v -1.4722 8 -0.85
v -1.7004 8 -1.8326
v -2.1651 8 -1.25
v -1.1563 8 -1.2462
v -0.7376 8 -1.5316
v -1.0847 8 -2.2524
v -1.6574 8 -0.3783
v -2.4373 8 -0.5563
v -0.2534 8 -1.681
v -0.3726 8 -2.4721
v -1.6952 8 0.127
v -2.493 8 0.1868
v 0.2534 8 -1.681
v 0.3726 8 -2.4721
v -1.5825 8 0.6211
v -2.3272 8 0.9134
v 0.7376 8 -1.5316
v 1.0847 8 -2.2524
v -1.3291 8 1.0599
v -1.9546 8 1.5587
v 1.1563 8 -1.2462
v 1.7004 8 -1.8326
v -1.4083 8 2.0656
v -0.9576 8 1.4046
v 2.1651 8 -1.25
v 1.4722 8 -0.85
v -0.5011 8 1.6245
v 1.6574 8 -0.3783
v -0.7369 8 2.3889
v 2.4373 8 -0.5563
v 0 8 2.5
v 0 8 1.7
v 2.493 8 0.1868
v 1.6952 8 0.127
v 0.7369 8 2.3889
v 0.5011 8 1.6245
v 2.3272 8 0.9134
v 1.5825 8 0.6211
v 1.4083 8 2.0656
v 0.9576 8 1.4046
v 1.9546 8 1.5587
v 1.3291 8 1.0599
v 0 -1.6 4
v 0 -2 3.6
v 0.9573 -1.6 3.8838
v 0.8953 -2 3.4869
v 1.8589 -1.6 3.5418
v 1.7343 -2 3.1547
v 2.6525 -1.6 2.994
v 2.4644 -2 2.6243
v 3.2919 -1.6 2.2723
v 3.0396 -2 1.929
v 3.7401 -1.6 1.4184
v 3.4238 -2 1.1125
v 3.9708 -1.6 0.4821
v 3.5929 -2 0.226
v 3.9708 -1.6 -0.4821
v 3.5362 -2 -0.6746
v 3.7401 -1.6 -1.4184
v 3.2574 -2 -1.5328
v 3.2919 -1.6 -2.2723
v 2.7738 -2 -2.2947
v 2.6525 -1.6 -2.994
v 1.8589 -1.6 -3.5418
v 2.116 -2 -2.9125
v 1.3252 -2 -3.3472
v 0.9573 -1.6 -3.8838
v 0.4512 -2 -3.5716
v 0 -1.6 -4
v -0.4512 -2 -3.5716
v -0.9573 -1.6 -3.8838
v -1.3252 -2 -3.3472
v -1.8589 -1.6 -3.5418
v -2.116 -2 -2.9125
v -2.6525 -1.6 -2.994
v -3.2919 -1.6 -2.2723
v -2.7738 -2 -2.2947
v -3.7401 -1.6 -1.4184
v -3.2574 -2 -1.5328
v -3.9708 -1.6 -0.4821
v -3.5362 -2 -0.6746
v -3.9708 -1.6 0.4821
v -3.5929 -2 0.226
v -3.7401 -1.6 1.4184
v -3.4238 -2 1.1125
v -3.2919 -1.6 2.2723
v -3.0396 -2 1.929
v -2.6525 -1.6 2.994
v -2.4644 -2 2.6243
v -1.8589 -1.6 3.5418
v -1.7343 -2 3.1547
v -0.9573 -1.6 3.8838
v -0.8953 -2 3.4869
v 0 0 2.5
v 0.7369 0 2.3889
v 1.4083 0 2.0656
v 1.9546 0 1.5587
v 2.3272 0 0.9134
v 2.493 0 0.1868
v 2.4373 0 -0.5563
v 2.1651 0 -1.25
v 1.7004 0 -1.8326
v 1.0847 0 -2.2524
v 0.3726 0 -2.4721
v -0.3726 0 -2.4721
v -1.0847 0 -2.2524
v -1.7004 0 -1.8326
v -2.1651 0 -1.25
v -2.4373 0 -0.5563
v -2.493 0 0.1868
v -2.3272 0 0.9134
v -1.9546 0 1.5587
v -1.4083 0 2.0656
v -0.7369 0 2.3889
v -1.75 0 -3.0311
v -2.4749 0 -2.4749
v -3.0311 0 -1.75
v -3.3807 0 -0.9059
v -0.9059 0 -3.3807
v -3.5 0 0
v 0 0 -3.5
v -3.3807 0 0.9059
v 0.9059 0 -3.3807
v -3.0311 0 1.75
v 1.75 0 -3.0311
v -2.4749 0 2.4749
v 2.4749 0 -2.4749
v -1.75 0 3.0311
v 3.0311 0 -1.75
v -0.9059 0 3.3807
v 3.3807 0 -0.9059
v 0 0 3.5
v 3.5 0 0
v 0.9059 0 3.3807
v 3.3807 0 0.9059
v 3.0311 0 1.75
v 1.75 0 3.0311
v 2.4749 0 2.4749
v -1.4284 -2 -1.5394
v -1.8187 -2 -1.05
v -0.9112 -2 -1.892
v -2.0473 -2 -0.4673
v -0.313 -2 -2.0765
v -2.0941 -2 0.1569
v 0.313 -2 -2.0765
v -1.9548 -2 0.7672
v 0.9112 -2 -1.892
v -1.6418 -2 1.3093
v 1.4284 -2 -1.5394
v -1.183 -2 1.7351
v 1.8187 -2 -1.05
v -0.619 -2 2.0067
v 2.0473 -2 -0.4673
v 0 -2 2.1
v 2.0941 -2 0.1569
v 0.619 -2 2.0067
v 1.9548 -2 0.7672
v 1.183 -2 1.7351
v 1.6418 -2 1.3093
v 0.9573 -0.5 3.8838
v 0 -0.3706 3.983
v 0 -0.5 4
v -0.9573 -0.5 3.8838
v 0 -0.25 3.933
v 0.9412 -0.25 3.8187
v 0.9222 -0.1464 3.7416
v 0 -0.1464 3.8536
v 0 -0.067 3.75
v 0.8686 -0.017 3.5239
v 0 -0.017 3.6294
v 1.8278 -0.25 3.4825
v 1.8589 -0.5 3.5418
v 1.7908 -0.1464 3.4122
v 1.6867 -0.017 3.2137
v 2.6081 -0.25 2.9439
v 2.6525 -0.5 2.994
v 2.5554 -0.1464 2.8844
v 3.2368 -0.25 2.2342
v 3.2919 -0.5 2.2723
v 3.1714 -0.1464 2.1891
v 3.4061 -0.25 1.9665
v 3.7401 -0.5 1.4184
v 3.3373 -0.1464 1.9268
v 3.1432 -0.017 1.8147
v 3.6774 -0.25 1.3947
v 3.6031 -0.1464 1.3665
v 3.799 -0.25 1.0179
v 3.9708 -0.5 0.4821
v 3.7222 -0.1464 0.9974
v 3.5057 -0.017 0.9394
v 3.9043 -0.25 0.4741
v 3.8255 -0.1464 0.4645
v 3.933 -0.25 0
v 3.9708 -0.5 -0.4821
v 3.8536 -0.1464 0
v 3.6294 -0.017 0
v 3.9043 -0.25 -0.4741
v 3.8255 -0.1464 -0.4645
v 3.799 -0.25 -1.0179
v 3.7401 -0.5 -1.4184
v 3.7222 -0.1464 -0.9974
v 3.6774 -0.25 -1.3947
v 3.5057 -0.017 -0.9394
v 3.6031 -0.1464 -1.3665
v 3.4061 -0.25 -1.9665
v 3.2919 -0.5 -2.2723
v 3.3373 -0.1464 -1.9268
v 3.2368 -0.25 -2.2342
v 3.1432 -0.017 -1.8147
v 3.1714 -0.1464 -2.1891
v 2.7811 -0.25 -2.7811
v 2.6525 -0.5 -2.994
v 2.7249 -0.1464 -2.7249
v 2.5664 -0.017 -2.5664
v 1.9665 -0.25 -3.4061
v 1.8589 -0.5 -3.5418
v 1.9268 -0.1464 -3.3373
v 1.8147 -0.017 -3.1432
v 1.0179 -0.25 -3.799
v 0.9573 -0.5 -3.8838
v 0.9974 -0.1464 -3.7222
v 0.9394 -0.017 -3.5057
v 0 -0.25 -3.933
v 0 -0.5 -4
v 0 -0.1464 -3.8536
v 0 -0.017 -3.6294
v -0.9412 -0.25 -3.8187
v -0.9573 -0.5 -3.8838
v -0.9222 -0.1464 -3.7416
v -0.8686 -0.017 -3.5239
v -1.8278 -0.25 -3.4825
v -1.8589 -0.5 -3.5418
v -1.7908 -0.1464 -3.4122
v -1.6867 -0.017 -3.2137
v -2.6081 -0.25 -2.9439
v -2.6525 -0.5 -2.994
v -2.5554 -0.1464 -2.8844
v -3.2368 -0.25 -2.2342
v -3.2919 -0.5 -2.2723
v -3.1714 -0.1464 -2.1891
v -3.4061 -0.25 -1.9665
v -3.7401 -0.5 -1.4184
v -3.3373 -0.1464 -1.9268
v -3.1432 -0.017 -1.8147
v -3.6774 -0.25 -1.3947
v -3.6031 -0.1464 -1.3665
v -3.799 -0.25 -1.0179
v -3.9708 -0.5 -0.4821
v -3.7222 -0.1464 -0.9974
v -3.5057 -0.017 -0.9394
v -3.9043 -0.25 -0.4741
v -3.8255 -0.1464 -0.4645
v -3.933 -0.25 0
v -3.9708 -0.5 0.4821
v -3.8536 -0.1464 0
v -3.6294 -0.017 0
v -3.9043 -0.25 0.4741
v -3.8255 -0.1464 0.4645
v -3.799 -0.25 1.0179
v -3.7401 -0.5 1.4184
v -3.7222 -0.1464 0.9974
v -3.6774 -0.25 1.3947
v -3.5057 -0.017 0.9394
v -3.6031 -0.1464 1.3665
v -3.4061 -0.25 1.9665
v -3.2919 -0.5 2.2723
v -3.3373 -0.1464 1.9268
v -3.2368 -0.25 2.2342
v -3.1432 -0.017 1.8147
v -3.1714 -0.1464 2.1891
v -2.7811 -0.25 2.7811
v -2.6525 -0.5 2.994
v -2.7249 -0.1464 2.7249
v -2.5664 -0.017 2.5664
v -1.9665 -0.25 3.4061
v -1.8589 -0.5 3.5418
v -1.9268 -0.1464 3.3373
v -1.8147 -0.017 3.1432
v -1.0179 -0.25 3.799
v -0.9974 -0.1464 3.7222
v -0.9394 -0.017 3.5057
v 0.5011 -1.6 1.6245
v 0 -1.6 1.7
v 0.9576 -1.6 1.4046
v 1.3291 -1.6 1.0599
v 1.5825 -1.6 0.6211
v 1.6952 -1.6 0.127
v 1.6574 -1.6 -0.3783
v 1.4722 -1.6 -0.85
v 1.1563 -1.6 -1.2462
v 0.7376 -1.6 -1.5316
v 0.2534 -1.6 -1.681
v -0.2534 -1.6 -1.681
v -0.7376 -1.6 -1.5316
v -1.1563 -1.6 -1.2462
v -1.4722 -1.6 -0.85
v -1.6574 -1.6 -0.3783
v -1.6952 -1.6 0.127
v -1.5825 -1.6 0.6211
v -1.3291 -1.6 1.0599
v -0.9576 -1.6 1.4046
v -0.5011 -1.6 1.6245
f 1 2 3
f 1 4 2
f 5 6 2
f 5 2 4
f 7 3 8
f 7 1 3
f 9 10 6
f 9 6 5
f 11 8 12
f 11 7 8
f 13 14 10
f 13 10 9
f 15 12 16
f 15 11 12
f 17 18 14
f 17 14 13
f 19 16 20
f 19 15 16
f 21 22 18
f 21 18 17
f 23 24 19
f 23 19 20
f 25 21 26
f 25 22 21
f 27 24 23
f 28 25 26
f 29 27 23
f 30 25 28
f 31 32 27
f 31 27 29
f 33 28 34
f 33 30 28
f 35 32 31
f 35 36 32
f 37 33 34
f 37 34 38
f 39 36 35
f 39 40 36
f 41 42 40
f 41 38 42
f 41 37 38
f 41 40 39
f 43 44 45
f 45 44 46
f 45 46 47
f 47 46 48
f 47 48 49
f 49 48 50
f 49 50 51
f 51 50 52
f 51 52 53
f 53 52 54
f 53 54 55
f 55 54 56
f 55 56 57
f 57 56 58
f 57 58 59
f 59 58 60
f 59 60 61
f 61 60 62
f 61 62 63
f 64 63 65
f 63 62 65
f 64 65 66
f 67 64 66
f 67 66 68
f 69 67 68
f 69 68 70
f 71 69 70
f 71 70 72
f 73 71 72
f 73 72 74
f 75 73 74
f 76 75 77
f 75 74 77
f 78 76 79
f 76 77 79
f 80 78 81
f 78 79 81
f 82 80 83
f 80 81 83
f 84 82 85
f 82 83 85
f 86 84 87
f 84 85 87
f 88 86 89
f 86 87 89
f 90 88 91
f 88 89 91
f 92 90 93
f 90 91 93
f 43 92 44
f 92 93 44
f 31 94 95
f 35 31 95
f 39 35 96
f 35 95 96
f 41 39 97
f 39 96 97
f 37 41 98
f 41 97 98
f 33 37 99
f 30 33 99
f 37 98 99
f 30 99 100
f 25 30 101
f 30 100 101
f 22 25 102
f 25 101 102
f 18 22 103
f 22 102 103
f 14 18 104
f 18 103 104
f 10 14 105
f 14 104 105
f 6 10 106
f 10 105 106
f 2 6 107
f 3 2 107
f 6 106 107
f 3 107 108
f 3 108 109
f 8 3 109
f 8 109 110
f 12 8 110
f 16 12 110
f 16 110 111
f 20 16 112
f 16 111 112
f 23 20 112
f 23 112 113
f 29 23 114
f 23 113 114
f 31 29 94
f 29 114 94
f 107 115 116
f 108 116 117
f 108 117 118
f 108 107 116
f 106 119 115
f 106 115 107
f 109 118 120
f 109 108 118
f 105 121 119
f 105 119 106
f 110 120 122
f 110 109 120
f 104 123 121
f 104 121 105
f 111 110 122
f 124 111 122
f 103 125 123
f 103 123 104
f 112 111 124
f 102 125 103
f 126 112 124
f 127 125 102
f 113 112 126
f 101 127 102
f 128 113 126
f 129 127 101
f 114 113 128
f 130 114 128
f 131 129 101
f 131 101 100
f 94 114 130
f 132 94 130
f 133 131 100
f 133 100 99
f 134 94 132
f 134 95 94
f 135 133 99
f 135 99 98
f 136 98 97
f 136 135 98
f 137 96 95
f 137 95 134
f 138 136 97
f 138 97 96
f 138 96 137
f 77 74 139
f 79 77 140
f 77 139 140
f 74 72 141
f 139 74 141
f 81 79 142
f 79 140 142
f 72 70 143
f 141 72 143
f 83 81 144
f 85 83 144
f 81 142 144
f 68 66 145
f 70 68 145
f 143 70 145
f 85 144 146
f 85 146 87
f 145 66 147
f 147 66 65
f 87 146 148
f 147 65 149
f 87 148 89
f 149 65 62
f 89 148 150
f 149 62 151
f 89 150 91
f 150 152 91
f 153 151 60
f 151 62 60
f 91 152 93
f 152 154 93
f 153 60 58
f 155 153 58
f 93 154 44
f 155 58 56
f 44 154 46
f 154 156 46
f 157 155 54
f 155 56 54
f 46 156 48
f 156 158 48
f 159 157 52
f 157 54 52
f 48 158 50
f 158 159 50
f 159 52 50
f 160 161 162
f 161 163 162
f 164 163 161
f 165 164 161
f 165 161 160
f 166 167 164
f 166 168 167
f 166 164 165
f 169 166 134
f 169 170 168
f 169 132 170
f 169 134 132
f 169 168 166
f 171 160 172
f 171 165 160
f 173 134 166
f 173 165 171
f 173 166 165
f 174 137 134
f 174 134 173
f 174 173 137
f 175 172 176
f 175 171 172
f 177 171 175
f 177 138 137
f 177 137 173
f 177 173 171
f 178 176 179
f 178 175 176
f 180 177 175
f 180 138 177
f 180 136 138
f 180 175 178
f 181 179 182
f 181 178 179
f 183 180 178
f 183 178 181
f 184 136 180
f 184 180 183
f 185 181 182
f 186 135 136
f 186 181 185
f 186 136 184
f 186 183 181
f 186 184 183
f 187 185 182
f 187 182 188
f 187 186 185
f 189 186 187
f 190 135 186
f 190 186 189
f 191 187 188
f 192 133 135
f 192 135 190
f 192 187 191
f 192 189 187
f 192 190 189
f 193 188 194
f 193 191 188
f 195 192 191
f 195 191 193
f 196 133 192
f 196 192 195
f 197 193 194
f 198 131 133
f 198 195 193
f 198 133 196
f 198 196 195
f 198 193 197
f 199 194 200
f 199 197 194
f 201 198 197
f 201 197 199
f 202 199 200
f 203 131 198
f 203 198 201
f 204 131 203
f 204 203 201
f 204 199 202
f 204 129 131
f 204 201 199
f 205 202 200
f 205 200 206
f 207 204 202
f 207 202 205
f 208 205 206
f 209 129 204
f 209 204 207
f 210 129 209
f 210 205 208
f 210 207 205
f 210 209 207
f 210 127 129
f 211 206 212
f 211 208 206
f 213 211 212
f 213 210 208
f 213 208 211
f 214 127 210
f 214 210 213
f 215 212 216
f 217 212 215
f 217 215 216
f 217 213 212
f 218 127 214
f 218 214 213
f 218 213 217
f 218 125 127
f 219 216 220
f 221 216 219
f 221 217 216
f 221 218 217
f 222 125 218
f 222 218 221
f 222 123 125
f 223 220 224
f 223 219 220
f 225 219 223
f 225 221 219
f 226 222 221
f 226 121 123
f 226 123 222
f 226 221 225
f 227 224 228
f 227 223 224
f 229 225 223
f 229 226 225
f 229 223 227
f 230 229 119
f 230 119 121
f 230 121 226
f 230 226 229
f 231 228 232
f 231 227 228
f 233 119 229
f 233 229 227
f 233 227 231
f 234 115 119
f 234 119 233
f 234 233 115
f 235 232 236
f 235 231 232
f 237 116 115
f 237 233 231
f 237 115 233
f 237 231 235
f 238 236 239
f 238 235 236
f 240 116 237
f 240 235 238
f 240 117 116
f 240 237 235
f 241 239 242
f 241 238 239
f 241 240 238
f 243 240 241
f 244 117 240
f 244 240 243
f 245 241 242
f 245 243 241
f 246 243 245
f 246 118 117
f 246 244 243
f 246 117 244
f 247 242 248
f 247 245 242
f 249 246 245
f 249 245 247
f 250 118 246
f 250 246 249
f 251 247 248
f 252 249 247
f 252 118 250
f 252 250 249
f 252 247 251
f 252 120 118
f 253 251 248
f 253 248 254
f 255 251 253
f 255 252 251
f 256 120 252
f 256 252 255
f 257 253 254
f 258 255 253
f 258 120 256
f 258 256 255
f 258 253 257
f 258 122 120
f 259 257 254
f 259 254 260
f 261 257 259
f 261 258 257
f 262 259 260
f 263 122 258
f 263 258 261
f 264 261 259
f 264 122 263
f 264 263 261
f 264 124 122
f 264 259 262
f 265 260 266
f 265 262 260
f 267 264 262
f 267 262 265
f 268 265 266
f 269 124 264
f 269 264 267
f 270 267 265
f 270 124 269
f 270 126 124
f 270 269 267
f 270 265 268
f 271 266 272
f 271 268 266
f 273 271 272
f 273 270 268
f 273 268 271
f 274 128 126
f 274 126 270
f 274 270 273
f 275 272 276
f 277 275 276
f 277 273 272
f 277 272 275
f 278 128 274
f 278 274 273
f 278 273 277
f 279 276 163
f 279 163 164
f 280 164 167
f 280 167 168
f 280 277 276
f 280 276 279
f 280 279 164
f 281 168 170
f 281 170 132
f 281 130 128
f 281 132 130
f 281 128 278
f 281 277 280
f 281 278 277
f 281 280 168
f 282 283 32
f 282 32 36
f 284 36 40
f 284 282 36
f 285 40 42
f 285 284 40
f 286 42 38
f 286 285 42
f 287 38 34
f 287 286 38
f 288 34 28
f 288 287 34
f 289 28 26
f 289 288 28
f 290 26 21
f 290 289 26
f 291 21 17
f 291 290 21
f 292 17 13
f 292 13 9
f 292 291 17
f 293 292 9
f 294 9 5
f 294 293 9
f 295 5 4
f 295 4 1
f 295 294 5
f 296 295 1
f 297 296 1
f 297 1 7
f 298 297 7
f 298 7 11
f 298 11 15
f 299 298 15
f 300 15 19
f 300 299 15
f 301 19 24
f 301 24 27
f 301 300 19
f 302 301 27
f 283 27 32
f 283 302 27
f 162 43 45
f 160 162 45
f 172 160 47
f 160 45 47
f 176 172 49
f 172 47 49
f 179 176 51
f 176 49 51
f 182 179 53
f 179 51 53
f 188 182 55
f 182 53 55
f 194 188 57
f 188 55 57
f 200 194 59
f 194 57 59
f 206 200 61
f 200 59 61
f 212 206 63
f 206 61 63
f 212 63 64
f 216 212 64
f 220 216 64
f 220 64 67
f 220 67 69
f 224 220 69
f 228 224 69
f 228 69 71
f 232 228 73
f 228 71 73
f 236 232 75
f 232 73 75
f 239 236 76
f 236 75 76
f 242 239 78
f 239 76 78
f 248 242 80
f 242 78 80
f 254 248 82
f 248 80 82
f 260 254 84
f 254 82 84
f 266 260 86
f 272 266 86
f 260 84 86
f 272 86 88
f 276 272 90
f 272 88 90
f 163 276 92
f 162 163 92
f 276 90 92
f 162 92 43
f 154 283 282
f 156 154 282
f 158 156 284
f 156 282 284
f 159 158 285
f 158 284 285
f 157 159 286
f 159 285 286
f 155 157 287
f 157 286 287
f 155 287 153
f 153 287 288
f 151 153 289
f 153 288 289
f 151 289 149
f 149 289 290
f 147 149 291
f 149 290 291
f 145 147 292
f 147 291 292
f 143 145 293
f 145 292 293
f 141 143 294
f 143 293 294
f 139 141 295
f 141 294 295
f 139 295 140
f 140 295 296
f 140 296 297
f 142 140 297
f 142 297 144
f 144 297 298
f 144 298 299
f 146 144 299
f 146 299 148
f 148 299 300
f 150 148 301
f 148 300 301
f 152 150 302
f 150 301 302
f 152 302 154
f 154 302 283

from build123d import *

# Parameters (mm, degrees)
SKETCH1_R           = 2.5
SKETCH1_R_2         = 1.7
BOSS_EXTRUDE1_DEPTH = 8
BOSS_EXTRUDE2_START = -2
SKETCH1_3_R         = 4
SKETCH1_3_R_2       = 3
SKETCH1_3_R_3       = 2.5
SKETCH1_3_R_4       = 1.7
BOSS_EXTRUDE2_DEPTH = 2
FILLET1_R           = 0.5
CHAMFER1_SIZE       = 0.4


with BuildPart() as part:
    # Sketch1 → Boss-Extrude1 (new body)
    with BuildSketch(Plane(origin=(0, 0, 0), x_dir=(1, 0, 0), z_dir=(0, 1, 0))):
        with Locations(Location((0, 0, 0), (0, 0, 270))):
            Circle(SKETCH1_R)
        with Locations(Location((0, 0, 0), (0, 0, 270))):
            Circle(SKETCH1_R_2, mode=Mode.SUBTRACT)
    extrude(amount=BOSS_EXTRUDE1_DEPTH)

    # Sketch1<3> → Boss-Extrude2 (add)
    # profile 1 of 3: a face of its own
    with BuildSketch(Plane(origin=(0, 0, 0), x_dir=(1, 0, 0), z_dir=(0, 1, 0)).offset(BOSS_EXTRUDE2_START)):
        with Locations(Location((0, 0, 0), (0, 0, 270))):
            Circle(SKETCH1_3_R)
        Circle(SKETCH1_3_R_2, mode=Mode.SUBTRACT)
    # profile 2 of 3: a face of its own
    with BuildSketch(Plane(origin=(0, 0, 0), x_dir=(1, 0, 0), z_dir=(0, 1, 0)).offset(BOSS_EXTRUDE2_START)):
        Circle(SKETCH1_3_R_2)
        with Locations(Location((0, 0, 0), (0, 0, 270))):
            Circle(SKETCH1_3_R_3, mode=Mode.SUBTRACT)
    # profile 3 of 3: a face of its own
    with BuildSketch(Plane(origin=(0, 0, 0), x_dir=(1, 0, 0), z_dir=(0, 1, 0)).offset(BOSS_EXTRUDE2_START)):
        with Locations(Location((0, 0, 0), (0, 0, 270))):
            Circle(SKETCH1_3_R_3)
        with Locations(Location((0, 0, 0), (0, 0, 270))):
            Circle(SKETCH1_3_R_4, mode=Mode.SUBTRACT)
    extrude(amount=BOSS_EXTRUDE2_DEPTH)

    # Fillet1
    fillet1_edges = [part.edges().sort_by_distance(p)[0] for p in [
        (0, 0, -4),
    ]]
    fillet(fillet1_edges, radius=FILLET1_R)

    # Chamfer1
    chamfer1_edges = [part.edges().sort_by_distance(p)[0] for p in [
        (0, -2, -4),
        (0, -2, -1.7),
    ]]
    chamfer(chamfer1_edges, length=CHAMFER1_SIZE)


solid = part.part
